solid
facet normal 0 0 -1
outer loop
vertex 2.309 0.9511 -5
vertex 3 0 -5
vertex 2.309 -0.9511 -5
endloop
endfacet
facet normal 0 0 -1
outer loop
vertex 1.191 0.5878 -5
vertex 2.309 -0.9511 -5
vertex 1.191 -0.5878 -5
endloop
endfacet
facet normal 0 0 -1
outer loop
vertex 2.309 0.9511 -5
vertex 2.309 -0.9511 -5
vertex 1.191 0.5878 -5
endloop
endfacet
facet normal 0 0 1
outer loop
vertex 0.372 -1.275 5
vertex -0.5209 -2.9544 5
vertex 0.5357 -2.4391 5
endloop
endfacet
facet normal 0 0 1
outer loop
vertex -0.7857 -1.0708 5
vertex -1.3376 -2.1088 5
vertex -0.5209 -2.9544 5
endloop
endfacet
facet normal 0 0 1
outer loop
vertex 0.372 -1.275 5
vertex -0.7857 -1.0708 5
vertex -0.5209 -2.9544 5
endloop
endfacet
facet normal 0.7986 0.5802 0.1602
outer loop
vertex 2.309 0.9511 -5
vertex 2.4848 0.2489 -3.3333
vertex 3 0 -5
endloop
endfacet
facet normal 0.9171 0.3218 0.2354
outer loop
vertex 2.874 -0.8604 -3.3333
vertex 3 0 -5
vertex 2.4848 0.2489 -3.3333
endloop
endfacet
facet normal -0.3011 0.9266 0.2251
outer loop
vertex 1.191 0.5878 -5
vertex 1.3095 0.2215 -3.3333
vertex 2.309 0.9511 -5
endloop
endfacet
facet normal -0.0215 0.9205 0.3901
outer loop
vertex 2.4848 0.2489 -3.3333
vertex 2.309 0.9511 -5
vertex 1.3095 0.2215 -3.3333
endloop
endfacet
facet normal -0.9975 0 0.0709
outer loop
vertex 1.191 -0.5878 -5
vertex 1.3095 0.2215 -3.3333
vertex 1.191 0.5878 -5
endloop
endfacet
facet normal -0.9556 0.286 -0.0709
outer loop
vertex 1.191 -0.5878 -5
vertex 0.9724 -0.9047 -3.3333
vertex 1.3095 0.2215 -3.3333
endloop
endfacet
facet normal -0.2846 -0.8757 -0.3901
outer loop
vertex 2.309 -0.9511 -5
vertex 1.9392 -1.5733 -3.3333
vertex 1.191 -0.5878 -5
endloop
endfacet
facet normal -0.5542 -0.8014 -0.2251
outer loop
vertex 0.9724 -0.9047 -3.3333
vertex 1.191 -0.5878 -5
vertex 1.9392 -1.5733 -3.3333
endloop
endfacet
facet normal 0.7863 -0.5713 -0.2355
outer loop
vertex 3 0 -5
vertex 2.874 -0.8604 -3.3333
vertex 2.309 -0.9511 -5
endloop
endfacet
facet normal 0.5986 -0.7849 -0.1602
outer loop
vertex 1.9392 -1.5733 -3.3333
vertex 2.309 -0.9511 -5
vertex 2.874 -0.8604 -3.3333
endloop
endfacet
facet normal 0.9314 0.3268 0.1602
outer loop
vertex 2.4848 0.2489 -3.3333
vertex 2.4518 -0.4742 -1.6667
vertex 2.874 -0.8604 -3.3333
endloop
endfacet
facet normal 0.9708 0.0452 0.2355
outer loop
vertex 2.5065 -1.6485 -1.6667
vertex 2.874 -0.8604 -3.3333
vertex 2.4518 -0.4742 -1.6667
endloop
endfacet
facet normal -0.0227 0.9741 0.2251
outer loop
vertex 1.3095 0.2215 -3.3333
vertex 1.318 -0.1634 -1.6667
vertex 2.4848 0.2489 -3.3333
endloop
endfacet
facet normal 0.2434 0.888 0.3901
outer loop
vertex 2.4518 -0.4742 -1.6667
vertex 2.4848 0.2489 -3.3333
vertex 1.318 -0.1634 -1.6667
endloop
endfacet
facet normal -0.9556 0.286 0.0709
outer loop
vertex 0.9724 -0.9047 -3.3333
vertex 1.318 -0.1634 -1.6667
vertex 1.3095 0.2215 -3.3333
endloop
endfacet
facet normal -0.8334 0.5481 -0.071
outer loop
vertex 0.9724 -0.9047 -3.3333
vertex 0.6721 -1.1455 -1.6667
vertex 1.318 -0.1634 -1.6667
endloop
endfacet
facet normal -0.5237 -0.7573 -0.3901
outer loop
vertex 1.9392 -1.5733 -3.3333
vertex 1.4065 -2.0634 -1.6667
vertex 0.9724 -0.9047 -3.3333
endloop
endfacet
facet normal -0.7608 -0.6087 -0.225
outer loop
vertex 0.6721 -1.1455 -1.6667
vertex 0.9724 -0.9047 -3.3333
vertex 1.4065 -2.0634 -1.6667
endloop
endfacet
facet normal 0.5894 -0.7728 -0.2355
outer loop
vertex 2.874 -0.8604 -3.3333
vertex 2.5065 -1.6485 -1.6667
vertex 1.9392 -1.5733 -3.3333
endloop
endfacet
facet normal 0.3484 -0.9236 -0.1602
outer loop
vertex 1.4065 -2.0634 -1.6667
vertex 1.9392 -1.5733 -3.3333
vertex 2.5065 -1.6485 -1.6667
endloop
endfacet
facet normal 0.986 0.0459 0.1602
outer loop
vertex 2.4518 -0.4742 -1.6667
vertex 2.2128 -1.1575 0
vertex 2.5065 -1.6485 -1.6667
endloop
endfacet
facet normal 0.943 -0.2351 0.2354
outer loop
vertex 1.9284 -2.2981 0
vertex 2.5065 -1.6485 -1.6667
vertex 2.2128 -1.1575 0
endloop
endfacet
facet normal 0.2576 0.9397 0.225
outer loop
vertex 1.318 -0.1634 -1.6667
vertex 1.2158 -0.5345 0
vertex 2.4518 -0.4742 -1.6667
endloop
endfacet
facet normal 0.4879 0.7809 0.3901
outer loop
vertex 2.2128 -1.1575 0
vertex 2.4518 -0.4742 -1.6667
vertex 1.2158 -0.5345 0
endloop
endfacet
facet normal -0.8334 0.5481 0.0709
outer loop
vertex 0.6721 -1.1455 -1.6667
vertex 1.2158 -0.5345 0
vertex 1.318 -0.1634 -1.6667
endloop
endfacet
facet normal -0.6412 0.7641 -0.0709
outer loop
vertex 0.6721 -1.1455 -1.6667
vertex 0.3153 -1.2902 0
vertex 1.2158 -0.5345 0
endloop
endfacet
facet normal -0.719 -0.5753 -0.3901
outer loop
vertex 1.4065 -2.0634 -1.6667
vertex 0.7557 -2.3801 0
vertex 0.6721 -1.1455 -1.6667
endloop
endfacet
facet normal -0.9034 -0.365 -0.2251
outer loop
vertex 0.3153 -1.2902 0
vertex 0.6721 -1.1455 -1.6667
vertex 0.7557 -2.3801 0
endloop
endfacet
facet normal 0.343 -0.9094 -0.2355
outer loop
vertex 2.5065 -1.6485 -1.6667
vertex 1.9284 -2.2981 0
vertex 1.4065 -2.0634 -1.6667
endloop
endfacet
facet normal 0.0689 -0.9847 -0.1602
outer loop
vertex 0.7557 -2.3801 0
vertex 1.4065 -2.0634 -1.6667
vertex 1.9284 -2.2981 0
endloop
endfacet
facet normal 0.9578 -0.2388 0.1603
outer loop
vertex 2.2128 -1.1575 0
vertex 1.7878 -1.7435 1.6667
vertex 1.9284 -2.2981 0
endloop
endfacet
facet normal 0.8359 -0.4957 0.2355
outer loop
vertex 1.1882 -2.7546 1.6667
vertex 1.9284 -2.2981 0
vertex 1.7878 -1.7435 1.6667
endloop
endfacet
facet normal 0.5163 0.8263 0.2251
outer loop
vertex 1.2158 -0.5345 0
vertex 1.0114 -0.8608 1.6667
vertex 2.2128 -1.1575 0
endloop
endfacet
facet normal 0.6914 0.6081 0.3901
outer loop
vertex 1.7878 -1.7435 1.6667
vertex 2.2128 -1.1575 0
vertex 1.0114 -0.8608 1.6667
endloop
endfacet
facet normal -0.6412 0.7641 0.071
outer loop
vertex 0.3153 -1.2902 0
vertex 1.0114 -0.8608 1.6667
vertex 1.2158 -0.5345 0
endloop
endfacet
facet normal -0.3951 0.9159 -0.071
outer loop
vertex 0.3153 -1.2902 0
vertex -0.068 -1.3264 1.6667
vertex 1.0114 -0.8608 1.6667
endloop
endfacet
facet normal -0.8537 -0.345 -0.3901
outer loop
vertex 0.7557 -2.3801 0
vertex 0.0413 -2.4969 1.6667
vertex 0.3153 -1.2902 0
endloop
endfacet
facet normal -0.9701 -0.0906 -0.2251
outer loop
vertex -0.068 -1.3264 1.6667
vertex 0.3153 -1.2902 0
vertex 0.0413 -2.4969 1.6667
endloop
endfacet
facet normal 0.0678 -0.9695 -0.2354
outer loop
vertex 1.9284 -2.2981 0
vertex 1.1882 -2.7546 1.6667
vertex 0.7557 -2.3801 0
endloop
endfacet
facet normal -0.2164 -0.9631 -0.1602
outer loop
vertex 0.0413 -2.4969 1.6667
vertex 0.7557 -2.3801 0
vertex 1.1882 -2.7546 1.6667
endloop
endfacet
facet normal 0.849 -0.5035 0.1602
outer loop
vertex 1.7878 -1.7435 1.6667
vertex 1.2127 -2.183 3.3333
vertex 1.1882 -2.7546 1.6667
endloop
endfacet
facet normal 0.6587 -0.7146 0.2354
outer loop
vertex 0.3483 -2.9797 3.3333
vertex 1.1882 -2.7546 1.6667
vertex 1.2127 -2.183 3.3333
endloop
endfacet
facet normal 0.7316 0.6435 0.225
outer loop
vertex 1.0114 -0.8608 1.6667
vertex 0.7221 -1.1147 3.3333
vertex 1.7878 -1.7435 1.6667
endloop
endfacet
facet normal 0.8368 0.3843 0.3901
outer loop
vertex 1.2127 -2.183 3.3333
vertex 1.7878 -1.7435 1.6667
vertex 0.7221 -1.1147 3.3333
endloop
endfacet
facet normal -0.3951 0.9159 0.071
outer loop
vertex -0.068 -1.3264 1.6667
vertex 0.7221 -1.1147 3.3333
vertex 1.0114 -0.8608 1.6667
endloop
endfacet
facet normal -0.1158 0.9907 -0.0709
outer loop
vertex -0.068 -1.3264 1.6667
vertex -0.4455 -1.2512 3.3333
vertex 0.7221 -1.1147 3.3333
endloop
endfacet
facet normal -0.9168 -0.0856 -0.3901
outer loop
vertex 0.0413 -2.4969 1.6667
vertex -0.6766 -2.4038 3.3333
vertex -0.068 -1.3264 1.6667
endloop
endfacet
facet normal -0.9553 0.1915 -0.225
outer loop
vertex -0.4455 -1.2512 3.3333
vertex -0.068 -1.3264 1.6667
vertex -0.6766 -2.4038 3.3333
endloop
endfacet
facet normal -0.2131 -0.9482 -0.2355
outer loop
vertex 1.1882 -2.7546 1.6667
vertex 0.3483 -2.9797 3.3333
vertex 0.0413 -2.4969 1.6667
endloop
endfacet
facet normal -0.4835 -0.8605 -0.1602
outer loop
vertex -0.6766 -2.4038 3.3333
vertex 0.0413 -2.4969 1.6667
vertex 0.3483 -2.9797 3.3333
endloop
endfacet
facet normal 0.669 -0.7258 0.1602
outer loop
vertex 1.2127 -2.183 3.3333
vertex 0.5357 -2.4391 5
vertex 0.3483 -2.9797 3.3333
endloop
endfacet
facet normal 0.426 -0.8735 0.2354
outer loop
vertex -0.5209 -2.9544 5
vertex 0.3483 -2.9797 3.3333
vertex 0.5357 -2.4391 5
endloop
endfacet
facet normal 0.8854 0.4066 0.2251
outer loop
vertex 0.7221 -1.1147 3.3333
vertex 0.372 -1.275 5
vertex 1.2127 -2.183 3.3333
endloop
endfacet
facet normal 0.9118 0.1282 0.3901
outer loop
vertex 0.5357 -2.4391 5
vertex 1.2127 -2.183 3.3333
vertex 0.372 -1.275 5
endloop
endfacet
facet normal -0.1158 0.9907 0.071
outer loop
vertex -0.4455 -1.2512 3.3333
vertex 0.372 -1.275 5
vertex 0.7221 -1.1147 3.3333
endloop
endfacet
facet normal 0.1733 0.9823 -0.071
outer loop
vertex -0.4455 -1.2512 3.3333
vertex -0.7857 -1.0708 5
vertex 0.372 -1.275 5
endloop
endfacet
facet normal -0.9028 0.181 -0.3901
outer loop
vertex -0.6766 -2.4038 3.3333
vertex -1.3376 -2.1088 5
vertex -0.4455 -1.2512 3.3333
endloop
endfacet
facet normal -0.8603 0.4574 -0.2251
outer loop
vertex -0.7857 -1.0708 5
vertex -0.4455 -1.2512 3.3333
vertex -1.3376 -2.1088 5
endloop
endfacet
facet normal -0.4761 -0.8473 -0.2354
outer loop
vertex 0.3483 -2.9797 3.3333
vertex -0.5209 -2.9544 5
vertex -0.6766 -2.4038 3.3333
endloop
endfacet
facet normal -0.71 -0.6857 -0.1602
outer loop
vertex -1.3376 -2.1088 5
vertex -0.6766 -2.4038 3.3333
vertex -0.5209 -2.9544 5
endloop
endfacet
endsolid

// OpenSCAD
// Unit of length: Unit.MM
linear_extrude(height = 10.0, center = true, convexity = 10, twist = 100.0, scale = 1.0)
{
   translate(v = [2.0, 0.0])
   {
      circle(d = 2.0);
   }
}
